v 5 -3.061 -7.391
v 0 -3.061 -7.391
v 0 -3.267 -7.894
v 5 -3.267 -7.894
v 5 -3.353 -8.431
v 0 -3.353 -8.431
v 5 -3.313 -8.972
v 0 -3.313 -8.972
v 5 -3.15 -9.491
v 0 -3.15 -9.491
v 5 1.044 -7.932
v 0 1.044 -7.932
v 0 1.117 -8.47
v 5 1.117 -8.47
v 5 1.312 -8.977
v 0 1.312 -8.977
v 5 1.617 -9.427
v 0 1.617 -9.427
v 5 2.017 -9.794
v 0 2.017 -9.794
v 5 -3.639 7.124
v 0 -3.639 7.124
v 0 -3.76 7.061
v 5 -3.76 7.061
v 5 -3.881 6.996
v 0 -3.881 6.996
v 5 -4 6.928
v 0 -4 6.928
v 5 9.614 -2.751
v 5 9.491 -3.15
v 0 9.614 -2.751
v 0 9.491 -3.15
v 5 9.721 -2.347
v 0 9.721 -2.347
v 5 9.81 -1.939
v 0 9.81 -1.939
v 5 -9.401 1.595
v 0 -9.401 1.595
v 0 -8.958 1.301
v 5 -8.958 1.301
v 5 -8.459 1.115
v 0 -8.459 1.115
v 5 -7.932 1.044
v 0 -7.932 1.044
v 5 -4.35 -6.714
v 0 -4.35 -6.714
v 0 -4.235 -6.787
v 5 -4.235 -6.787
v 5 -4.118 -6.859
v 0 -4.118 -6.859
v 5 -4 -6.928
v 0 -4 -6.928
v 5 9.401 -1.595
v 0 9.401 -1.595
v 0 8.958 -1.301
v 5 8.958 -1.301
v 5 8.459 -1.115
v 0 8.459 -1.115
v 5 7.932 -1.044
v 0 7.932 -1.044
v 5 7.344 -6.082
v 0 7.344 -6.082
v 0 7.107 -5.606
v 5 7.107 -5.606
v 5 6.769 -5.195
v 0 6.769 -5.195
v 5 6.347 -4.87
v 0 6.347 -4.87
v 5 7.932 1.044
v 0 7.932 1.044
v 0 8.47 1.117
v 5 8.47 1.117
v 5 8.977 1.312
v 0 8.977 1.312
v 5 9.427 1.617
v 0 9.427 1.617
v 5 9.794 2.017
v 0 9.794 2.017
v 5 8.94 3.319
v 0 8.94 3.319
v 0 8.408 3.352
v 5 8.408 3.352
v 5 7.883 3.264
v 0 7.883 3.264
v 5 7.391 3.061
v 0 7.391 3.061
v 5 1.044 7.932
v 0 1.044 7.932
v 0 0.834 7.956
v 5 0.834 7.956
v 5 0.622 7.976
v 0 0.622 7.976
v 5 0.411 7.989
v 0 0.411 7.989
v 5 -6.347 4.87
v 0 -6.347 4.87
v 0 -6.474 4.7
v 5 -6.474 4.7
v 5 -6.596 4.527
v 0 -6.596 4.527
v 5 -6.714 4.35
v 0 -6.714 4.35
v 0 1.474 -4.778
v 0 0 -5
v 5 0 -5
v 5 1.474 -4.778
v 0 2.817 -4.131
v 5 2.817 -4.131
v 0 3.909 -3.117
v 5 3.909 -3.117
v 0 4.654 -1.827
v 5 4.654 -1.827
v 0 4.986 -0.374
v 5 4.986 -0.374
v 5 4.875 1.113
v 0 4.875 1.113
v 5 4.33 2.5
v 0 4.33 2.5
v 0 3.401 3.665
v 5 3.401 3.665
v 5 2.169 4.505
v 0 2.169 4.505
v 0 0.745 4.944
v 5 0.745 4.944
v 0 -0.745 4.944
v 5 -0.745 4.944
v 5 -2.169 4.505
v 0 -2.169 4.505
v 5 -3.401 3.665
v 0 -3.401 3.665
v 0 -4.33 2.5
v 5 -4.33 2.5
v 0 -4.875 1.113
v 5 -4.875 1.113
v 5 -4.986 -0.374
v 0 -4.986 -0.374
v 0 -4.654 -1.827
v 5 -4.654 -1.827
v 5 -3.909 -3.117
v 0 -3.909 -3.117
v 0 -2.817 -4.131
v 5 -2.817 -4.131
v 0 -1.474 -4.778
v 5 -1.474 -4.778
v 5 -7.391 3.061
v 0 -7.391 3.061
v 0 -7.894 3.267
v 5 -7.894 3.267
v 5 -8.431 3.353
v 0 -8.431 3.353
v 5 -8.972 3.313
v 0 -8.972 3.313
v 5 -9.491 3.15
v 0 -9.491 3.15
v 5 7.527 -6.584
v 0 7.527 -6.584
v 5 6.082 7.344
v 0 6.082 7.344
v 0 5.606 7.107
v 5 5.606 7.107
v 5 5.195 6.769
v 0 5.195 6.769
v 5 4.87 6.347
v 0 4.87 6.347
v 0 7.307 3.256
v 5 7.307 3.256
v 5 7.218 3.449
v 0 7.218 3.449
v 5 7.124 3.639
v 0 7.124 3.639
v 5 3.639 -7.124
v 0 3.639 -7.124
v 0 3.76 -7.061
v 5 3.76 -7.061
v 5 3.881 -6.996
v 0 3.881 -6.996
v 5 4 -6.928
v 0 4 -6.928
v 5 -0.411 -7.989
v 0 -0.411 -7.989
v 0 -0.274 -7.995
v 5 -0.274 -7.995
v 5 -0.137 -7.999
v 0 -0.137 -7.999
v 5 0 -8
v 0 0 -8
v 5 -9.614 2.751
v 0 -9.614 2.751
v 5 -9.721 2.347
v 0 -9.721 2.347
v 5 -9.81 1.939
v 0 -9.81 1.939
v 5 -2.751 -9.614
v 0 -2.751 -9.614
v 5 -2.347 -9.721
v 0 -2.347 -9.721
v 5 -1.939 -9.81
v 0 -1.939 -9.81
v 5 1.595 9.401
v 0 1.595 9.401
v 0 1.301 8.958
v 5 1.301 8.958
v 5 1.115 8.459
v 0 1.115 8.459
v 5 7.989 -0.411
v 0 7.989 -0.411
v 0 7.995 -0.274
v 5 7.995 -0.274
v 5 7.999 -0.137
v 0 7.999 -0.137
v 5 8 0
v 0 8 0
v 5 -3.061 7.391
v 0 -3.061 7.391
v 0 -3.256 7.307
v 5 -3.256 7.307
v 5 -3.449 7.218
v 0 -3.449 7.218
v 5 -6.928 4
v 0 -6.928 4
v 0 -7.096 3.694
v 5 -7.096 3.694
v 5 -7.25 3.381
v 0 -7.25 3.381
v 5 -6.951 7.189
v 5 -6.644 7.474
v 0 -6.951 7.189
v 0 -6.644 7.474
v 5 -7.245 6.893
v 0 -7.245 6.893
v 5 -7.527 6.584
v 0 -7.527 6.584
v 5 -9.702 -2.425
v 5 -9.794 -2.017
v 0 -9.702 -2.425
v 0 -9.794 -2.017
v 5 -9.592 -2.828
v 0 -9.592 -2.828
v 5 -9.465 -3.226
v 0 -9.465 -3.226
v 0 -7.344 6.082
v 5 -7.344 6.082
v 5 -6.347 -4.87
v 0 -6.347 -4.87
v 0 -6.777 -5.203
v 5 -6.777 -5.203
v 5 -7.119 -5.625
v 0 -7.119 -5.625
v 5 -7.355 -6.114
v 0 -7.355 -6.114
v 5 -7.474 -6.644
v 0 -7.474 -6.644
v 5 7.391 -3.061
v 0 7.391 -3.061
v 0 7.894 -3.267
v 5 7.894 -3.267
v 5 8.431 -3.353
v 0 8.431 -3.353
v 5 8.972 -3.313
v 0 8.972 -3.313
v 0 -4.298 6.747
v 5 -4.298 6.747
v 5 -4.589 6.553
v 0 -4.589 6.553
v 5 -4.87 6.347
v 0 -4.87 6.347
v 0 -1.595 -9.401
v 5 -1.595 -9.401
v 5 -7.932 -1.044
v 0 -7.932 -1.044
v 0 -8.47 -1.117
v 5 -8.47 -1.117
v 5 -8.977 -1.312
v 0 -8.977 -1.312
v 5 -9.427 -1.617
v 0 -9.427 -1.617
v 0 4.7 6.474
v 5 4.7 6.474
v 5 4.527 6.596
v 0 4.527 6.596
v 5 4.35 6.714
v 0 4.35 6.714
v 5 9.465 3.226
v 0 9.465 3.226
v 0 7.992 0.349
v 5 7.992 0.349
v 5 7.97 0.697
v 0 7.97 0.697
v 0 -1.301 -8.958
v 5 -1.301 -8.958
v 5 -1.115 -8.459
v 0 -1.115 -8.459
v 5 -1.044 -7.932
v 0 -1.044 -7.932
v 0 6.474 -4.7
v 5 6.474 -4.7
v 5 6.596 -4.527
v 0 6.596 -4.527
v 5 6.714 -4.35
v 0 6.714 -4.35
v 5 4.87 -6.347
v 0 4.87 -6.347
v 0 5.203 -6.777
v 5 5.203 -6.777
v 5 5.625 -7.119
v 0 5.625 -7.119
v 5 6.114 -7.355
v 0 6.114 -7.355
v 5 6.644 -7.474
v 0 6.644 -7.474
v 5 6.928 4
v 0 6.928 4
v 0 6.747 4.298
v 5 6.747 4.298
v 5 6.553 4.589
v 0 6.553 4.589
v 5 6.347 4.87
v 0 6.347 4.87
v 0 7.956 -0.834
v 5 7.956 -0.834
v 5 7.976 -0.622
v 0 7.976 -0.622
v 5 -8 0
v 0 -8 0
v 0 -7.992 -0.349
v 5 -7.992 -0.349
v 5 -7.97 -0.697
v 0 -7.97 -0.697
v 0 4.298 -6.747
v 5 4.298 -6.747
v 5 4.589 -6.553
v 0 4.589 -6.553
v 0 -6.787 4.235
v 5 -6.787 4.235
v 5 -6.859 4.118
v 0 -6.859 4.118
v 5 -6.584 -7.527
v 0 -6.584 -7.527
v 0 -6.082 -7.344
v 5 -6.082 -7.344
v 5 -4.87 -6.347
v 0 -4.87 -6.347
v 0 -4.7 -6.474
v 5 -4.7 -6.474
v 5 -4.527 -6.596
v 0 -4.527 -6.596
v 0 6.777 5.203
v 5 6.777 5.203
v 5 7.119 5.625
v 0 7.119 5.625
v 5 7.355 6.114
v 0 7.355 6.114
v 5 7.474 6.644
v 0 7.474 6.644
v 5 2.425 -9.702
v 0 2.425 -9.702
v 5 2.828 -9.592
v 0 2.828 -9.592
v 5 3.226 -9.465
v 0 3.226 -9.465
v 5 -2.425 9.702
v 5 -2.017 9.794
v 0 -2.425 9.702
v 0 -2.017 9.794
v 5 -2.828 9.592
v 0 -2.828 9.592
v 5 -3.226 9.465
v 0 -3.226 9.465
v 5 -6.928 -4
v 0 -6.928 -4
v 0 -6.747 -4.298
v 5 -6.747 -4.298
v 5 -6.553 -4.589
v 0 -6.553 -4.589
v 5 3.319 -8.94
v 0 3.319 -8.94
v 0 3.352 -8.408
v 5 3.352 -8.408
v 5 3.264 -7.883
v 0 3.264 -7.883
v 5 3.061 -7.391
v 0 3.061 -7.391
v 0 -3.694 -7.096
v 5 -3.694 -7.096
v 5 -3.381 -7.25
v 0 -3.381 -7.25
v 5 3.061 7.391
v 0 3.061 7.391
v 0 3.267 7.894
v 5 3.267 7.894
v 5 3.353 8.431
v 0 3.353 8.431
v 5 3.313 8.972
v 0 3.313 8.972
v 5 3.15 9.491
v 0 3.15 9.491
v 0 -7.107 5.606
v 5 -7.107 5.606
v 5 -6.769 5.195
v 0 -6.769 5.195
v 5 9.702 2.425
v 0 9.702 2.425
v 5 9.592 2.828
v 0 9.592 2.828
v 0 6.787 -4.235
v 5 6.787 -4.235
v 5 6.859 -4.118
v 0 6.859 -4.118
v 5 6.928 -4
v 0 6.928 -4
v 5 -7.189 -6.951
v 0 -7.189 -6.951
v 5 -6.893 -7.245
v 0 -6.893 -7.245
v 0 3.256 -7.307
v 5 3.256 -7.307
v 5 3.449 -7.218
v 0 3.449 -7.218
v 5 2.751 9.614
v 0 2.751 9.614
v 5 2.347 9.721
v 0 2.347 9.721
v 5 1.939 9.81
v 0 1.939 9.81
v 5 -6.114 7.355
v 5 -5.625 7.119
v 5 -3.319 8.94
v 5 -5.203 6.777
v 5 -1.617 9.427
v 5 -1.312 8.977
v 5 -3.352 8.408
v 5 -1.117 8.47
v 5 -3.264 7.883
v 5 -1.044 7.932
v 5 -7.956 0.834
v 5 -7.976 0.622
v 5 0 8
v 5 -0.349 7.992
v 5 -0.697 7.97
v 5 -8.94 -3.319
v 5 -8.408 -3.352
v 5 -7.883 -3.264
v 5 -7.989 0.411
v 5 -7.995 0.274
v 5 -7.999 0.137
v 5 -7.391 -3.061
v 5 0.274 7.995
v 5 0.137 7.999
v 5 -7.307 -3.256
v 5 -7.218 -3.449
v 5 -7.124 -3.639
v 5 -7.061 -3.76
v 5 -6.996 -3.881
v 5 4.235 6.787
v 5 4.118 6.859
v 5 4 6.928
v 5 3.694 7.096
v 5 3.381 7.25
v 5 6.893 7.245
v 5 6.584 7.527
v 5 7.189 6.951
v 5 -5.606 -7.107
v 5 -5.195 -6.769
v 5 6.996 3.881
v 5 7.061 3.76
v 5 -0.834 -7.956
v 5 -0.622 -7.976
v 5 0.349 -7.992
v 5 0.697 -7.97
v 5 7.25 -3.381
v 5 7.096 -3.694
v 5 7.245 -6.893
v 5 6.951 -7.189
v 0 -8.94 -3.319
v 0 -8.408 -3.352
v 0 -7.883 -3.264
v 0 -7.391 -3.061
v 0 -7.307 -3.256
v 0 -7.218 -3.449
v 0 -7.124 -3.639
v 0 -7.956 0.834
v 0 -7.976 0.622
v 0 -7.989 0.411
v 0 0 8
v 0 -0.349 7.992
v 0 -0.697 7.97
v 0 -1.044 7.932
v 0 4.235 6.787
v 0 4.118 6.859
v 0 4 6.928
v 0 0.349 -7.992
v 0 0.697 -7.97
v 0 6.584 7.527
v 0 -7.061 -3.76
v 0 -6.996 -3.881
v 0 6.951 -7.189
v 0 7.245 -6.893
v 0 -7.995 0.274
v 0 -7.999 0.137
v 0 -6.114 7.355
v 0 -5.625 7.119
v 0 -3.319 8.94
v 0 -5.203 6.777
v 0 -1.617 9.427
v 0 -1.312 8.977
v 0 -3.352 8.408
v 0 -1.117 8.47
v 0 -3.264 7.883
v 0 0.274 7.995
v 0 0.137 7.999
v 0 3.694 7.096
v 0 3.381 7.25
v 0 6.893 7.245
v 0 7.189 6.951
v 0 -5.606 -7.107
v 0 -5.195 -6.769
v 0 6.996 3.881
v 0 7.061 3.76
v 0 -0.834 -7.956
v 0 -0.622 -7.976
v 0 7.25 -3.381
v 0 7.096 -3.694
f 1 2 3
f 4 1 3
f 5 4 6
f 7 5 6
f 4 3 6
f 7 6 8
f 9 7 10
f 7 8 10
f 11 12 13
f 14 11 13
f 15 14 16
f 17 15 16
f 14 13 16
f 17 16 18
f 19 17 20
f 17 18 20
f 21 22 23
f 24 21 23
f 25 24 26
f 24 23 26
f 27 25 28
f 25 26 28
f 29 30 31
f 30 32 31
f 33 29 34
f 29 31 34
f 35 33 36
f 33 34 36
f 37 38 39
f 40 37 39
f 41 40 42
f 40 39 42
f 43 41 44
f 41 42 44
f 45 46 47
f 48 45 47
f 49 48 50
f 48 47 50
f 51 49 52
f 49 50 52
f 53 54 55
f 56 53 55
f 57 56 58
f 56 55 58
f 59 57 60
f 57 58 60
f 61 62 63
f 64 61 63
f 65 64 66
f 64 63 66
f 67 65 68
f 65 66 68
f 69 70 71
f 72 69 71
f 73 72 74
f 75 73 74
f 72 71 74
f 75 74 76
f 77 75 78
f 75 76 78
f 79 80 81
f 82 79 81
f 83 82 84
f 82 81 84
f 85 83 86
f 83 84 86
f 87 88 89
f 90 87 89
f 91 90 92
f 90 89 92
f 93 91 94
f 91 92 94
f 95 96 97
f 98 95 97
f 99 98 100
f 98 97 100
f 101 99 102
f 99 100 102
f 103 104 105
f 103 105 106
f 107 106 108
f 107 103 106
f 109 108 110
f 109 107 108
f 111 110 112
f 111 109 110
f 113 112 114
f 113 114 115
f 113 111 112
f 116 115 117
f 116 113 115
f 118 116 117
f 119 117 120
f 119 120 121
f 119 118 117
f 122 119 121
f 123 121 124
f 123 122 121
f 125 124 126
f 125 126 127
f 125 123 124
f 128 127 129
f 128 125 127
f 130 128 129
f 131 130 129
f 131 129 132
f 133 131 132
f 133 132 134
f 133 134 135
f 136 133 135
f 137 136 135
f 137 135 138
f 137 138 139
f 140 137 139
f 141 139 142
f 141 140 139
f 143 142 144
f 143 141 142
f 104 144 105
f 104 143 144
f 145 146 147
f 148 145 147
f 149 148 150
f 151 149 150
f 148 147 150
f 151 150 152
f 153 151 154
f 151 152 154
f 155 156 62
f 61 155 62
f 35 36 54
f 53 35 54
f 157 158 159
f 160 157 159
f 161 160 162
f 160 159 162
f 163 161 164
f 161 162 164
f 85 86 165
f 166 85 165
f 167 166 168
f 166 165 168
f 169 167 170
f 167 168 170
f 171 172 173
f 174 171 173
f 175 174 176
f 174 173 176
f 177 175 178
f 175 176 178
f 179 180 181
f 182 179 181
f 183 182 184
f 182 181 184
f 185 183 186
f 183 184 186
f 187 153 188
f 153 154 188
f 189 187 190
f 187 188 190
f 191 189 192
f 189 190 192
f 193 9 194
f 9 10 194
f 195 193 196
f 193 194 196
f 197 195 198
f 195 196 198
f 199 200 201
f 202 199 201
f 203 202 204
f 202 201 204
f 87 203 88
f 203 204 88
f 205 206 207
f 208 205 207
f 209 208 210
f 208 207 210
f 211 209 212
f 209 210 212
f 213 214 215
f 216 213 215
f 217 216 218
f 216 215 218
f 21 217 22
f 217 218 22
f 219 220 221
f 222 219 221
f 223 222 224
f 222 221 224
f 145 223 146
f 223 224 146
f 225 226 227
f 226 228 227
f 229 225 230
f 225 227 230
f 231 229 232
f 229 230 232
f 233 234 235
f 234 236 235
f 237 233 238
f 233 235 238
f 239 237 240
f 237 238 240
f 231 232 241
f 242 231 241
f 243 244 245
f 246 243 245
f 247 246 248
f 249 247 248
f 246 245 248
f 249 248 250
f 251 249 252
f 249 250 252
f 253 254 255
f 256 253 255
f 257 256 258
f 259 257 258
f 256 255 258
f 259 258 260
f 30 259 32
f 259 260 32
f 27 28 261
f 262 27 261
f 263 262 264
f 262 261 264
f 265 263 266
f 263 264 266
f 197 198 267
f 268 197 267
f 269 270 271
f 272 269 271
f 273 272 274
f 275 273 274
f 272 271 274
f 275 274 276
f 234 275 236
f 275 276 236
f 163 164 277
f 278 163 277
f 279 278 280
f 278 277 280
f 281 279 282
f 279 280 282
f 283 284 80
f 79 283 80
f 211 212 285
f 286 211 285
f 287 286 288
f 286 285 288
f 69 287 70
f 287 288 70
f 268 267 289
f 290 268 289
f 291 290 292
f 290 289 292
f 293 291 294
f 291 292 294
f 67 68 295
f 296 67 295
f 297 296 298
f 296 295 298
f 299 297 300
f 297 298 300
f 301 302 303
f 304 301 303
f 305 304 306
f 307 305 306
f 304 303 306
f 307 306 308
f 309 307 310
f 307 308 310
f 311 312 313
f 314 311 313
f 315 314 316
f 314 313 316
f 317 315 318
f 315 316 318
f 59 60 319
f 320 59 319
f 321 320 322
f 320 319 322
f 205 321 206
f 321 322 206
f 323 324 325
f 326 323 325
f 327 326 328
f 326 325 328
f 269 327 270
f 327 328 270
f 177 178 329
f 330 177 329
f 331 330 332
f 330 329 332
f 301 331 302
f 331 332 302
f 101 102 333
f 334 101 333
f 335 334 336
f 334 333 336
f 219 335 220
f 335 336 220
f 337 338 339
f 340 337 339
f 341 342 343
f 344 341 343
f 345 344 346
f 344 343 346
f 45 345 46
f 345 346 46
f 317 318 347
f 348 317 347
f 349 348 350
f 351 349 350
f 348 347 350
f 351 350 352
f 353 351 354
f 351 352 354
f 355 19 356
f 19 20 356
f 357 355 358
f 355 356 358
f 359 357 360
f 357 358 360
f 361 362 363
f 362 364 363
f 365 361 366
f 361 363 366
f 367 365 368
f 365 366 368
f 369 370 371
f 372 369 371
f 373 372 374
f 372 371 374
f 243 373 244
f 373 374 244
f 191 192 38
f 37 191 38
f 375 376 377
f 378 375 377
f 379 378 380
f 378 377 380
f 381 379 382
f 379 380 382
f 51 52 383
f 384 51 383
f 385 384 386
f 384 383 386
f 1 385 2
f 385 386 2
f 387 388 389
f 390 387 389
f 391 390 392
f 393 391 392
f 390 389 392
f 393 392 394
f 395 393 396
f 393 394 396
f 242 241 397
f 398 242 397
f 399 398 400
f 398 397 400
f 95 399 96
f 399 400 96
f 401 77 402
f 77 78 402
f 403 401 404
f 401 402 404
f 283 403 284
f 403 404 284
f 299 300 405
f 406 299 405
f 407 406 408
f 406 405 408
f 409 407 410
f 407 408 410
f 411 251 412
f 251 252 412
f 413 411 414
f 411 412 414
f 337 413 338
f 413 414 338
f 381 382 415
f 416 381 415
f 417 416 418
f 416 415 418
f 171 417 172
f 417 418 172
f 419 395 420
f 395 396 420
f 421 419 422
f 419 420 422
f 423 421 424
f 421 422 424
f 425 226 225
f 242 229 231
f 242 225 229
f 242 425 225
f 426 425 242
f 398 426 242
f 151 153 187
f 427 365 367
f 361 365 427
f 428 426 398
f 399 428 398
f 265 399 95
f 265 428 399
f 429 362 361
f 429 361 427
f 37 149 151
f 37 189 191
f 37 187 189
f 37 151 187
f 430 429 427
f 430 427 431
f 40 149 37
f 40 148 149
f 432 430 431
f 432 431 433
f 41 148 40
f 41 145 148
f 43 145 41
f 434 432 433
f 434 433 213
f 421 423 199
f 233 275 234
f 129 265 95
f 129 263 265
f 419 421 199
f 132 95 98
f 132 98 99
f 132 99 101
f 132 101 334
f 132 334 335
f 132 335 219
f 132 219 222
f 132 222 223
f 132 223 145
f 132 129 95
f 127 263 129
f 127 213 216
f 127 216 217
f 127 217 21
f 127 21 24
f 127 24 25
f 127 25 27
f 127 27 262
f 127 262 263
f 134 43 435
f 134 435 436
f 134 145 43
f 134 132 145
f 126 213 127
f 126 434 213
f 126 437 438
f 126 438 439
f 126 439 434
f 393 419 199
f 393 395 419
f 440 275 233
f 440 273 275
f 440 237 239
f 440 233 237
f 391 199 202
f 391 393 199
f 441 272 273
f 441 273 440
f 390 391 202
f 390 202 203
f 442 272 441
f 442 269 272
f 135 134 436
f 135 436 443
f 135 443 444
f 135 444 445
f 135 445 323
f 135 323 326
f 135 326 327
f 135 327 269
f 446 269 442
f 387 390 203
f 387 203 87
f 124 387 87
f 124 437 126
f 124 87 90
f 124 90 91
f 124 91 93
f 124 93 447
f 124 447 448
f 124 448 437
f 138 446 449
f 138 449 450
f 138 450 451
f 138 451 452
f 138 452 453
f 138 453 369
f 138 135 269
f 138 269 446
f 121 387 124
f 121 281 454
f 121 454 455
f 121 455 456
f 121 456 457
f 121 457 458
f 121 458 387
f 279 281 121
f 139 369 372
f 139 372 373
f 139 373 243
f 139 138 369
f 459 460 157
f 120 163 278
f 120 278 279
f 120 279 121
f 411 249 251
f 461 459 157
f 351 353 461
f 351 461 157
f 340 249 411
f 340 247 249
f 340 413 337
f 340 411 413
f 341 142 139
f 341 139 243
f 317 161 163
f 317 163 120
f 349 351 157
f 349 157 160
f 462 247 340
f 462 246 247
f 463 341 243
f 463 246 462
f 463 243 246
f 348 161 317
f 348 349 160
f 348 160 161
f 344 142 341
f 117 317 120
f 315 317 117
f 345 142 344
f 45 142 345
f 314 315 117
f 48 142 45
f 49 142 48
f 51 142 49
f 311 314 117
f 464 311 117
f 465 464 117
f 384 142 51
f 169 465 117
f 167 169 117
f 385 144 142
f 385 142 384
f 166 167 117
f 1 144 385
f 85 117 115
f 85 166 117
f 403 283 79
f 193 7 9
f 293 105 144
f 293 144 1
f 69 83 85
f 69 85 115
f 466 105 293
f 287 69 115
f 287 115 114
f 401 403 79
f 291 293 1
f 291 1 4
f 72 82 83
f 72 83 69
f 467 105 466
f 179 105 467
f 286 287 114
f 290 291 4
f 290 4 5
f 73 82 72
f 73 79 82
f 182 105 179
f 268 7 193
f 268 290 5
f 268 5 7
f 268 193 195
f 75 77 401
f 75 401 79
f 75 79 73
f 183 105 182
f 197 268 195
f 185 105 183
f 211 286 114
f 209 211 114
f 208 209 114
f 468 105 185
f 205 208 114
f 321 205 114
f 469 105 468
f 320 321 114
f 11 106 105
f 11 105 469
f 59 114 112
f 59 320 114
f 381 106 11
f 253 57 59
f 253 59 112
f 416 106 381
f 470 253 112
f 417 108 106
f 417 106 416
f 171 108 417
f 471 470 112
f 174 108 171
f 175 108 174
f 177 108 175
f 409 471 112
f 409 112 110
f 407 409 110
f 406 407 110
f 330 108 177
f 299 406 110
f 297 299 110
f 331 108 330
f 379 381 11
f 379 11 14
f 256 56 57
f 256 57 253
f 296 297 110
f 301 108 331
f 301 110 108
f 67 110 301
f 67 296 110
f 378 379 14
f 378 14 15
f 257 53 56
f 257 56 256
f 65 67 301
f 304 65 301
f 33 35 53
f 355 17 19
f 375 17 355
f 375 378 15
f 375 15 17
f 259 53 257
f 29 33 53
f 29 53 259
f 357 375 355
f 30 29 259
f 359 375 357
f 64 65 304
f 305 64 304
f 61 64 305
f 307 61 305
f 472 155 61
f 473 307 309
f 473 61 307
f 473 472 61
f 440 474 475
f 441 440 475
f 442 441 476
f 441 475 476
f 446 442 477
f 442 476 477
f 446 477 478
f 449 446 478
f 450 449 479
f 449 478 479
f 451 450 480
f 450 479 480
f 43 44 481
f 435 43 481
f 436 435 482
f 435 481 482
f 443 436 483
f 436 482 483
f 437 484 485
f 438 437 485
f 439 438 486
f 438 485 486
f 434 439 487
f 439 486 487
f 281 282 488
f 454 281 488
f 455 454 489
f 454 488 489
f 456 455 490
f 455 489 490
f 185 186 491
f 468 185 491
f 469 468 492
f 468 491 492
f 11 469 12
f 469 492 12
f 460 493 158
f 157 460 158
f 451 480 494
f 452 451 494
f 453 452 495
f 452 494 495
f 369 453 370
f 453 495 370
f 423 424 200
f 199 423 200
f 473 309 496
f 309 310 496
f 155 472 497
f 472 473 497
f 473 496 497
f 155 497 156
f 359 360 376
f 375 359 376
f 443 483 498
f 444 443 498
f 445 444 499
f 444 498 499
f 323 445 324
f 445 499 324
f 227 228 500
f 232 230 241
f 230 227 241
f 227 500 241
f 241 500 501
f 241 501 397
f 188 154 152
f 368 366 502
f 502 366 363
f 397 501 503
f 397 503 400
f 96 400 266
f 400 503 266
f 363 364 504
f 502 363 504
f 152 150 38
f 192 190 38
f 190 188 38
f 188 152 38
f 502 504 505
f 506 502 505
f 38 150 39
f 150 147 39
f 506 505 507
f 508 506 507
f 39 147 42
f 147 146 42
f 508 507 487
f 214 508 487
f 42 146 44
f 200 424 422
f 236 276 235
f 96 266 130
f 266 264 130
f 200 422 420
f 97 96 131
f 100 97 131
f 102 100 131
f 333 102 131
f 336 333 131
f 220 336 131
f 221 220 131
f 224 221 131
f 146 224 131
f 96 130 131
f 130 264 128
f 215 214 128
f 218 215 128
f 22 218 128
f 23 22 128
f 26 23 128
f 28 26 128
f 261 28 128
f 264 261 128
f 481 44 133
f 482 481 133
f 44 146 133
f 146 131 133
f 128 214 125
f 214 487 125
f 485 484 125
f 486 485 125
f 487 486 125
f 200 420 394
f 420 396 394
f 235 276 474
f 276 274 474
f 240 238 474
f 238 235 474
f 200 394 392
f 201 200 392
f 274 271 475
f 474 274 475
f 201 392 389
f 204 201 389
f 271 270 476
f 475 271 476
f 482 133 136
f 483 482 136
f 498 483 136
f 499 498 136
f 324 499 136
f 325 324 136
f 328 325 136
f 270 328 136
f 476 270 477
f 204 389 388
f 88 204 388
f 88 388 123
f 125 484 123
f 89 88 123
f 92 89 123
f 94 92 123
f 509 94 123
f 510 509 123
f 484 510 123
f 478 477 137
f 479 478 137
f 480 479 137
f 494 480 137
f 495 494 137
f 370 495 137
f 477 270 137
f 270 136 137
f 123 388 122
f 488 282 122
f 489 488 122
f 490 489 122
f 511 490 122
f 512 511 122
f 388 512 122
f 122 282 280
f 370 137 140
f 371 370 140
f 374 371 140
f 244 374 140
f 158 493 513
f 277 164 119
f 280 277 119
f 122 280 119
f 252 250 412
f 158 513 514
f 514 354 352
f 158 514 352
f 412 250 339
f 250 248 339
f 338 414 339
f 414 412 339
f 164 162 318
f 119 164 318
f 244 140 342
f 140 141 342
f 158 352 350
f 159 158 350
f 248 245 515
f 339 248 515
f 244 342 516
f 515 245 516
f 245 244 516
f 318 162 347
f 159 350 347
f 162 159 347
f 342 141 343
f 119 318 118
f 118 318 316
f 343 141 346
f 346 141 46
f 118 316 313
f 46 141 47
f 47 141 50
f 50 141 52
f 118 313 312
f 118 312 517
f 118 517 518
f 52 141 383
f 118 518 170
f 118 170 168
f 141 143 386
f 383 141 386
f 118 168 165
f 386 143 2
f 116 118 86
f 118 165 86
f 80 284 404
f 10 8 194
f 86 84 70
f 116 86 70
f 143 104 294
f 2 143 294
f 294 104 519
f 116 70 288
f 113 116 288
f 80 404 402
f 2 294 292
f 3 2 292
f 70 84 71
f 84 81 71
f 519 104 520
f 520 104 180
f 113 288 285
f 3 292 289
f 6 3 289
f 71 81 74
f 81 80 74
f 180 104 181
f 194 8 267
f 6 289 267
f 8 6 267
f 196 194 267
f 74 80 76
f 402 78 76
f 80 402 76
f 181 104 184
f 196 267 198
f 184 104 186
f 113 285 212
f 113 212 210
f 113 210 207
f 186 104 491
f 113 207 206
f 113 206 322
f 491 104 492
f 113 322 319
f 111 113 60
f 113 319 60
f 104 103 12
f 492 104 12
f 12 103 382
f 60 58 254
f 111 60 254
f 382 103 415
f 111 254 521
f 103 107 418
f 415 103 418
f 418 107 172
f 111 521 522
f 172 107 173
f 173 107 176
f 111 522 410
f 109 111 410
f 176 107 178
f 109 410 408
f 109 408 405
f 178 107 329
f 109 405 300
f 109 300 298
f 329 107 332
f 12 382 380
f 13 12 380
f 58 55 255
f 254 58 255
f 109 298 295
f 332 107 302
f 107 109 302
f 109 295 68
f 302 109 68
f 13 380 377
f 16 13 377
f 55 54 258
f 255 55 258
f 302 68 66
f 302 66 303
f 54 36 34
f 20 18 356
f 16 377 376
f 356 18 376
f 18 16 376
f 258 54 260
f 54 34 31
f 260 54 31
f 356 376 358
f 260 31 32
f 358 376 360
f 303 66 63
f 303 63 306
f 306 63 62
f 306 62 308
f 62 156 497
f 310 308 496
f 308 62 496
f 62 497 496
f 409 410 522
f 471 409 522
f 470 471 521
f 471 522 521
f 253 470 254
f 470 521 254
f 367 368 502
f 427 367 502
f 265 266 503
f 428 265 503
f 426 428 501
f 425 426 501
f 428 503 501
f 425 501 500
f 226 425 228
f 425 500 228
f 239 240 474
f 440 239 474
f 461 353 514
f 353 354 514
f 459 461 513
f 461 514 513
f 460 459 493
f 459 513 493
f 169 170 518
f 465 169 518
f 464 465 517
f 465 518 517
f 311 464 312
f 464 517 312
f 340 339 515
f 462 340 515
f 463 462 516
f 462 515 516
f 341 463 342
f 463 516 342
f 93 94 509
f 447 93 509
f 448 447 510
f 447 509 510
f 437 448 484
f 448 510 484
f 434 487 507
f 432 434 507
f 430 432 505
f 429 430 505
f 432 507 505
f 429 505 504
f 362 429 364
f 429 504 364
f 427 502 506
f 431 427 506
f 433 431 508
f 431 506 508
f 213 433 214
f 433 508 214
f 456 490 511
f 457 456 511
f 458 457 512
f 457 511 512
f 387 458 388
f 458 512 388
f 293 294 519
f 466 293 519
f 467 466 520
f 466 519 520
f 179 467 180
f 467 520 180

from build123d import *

# Parameters (mm, degrees)
SKETCH3_R           = 10
BOSS_EXTRUDE1_DEPTH = 5
CUT_EXTRUDE1_DEPTH  = 5
CIRPATTERN1_COUNT   = 12
SKETCH3_3_R         = 5
CUT_EXTRUDE3_DEPTH  = 5


with BuildPart() as part:
    # Sketch3 → Boss-Extrude1 (new body)
    with BuildSketch(Plane(origin=(0, 0, 0), x_dir=(0, 0, -1), z_dir=(1, 0, 0))):
        Circle(SKETCH3_R)
    extrude(amount=BOSS_EXTRUDE1_DEPTH)

    # Gear_Profile → Cut-Extrude1 (cut)
    with BuildSketch(Plane.ZY):
        with BuildLine():
            ThreePointArc((-1.595423995, 9.401352278), (-1.193917878, 8.71367126), (-1.044209538, 7.931558891))
            ThreePointArc((-1.044209538, 7.931558891), (0, 8), (1.044209538, 7.931558891))
            ThreePointArc((1.044209538, 7.931558891), (1.311715504, 8.977395553), (2.017271047, 9.794417671))
            ThreePointArc((2.017271047, 9.794417671), (0.040143535, 9.999919425), (-1.938570153, 9.810297945))
            Line((-1.938570153, 9.810297945), (-1.595423995, 9.401352278))
        make_face()
    cut_extrude1 = extrude(amount=-CUT_EXTRUDE1_DEPTH, mode=Mode.SUBTRACT)

    # CirPattern1: Cut-Extrude1 ×12 about axis
    cirpattern1_axis = Axis((5, 0, 0), (-1, 0, 0))
    for i in range(1, CIRPATTERN1_COUNT):
        add(cut_extrude1.rotate(cirpattern1_axis, i * 360 / CIRPATTERN1_COUNT), mode=Mode.SUBTRACT)

    # Sketch3<3> → Cut-Extrude3 (cut)
    with BuildSketch(Plane(origin=(0, 0, 0), x_dir=(0, 0, -1), z_dir=(1, 0, 0))):
        Circle(SKETCH3_3_R)
    extrude(amount=CUT_EXTRUDE3_DEPTH, mode=Mode.SUBTRACT)


solid = part.part
